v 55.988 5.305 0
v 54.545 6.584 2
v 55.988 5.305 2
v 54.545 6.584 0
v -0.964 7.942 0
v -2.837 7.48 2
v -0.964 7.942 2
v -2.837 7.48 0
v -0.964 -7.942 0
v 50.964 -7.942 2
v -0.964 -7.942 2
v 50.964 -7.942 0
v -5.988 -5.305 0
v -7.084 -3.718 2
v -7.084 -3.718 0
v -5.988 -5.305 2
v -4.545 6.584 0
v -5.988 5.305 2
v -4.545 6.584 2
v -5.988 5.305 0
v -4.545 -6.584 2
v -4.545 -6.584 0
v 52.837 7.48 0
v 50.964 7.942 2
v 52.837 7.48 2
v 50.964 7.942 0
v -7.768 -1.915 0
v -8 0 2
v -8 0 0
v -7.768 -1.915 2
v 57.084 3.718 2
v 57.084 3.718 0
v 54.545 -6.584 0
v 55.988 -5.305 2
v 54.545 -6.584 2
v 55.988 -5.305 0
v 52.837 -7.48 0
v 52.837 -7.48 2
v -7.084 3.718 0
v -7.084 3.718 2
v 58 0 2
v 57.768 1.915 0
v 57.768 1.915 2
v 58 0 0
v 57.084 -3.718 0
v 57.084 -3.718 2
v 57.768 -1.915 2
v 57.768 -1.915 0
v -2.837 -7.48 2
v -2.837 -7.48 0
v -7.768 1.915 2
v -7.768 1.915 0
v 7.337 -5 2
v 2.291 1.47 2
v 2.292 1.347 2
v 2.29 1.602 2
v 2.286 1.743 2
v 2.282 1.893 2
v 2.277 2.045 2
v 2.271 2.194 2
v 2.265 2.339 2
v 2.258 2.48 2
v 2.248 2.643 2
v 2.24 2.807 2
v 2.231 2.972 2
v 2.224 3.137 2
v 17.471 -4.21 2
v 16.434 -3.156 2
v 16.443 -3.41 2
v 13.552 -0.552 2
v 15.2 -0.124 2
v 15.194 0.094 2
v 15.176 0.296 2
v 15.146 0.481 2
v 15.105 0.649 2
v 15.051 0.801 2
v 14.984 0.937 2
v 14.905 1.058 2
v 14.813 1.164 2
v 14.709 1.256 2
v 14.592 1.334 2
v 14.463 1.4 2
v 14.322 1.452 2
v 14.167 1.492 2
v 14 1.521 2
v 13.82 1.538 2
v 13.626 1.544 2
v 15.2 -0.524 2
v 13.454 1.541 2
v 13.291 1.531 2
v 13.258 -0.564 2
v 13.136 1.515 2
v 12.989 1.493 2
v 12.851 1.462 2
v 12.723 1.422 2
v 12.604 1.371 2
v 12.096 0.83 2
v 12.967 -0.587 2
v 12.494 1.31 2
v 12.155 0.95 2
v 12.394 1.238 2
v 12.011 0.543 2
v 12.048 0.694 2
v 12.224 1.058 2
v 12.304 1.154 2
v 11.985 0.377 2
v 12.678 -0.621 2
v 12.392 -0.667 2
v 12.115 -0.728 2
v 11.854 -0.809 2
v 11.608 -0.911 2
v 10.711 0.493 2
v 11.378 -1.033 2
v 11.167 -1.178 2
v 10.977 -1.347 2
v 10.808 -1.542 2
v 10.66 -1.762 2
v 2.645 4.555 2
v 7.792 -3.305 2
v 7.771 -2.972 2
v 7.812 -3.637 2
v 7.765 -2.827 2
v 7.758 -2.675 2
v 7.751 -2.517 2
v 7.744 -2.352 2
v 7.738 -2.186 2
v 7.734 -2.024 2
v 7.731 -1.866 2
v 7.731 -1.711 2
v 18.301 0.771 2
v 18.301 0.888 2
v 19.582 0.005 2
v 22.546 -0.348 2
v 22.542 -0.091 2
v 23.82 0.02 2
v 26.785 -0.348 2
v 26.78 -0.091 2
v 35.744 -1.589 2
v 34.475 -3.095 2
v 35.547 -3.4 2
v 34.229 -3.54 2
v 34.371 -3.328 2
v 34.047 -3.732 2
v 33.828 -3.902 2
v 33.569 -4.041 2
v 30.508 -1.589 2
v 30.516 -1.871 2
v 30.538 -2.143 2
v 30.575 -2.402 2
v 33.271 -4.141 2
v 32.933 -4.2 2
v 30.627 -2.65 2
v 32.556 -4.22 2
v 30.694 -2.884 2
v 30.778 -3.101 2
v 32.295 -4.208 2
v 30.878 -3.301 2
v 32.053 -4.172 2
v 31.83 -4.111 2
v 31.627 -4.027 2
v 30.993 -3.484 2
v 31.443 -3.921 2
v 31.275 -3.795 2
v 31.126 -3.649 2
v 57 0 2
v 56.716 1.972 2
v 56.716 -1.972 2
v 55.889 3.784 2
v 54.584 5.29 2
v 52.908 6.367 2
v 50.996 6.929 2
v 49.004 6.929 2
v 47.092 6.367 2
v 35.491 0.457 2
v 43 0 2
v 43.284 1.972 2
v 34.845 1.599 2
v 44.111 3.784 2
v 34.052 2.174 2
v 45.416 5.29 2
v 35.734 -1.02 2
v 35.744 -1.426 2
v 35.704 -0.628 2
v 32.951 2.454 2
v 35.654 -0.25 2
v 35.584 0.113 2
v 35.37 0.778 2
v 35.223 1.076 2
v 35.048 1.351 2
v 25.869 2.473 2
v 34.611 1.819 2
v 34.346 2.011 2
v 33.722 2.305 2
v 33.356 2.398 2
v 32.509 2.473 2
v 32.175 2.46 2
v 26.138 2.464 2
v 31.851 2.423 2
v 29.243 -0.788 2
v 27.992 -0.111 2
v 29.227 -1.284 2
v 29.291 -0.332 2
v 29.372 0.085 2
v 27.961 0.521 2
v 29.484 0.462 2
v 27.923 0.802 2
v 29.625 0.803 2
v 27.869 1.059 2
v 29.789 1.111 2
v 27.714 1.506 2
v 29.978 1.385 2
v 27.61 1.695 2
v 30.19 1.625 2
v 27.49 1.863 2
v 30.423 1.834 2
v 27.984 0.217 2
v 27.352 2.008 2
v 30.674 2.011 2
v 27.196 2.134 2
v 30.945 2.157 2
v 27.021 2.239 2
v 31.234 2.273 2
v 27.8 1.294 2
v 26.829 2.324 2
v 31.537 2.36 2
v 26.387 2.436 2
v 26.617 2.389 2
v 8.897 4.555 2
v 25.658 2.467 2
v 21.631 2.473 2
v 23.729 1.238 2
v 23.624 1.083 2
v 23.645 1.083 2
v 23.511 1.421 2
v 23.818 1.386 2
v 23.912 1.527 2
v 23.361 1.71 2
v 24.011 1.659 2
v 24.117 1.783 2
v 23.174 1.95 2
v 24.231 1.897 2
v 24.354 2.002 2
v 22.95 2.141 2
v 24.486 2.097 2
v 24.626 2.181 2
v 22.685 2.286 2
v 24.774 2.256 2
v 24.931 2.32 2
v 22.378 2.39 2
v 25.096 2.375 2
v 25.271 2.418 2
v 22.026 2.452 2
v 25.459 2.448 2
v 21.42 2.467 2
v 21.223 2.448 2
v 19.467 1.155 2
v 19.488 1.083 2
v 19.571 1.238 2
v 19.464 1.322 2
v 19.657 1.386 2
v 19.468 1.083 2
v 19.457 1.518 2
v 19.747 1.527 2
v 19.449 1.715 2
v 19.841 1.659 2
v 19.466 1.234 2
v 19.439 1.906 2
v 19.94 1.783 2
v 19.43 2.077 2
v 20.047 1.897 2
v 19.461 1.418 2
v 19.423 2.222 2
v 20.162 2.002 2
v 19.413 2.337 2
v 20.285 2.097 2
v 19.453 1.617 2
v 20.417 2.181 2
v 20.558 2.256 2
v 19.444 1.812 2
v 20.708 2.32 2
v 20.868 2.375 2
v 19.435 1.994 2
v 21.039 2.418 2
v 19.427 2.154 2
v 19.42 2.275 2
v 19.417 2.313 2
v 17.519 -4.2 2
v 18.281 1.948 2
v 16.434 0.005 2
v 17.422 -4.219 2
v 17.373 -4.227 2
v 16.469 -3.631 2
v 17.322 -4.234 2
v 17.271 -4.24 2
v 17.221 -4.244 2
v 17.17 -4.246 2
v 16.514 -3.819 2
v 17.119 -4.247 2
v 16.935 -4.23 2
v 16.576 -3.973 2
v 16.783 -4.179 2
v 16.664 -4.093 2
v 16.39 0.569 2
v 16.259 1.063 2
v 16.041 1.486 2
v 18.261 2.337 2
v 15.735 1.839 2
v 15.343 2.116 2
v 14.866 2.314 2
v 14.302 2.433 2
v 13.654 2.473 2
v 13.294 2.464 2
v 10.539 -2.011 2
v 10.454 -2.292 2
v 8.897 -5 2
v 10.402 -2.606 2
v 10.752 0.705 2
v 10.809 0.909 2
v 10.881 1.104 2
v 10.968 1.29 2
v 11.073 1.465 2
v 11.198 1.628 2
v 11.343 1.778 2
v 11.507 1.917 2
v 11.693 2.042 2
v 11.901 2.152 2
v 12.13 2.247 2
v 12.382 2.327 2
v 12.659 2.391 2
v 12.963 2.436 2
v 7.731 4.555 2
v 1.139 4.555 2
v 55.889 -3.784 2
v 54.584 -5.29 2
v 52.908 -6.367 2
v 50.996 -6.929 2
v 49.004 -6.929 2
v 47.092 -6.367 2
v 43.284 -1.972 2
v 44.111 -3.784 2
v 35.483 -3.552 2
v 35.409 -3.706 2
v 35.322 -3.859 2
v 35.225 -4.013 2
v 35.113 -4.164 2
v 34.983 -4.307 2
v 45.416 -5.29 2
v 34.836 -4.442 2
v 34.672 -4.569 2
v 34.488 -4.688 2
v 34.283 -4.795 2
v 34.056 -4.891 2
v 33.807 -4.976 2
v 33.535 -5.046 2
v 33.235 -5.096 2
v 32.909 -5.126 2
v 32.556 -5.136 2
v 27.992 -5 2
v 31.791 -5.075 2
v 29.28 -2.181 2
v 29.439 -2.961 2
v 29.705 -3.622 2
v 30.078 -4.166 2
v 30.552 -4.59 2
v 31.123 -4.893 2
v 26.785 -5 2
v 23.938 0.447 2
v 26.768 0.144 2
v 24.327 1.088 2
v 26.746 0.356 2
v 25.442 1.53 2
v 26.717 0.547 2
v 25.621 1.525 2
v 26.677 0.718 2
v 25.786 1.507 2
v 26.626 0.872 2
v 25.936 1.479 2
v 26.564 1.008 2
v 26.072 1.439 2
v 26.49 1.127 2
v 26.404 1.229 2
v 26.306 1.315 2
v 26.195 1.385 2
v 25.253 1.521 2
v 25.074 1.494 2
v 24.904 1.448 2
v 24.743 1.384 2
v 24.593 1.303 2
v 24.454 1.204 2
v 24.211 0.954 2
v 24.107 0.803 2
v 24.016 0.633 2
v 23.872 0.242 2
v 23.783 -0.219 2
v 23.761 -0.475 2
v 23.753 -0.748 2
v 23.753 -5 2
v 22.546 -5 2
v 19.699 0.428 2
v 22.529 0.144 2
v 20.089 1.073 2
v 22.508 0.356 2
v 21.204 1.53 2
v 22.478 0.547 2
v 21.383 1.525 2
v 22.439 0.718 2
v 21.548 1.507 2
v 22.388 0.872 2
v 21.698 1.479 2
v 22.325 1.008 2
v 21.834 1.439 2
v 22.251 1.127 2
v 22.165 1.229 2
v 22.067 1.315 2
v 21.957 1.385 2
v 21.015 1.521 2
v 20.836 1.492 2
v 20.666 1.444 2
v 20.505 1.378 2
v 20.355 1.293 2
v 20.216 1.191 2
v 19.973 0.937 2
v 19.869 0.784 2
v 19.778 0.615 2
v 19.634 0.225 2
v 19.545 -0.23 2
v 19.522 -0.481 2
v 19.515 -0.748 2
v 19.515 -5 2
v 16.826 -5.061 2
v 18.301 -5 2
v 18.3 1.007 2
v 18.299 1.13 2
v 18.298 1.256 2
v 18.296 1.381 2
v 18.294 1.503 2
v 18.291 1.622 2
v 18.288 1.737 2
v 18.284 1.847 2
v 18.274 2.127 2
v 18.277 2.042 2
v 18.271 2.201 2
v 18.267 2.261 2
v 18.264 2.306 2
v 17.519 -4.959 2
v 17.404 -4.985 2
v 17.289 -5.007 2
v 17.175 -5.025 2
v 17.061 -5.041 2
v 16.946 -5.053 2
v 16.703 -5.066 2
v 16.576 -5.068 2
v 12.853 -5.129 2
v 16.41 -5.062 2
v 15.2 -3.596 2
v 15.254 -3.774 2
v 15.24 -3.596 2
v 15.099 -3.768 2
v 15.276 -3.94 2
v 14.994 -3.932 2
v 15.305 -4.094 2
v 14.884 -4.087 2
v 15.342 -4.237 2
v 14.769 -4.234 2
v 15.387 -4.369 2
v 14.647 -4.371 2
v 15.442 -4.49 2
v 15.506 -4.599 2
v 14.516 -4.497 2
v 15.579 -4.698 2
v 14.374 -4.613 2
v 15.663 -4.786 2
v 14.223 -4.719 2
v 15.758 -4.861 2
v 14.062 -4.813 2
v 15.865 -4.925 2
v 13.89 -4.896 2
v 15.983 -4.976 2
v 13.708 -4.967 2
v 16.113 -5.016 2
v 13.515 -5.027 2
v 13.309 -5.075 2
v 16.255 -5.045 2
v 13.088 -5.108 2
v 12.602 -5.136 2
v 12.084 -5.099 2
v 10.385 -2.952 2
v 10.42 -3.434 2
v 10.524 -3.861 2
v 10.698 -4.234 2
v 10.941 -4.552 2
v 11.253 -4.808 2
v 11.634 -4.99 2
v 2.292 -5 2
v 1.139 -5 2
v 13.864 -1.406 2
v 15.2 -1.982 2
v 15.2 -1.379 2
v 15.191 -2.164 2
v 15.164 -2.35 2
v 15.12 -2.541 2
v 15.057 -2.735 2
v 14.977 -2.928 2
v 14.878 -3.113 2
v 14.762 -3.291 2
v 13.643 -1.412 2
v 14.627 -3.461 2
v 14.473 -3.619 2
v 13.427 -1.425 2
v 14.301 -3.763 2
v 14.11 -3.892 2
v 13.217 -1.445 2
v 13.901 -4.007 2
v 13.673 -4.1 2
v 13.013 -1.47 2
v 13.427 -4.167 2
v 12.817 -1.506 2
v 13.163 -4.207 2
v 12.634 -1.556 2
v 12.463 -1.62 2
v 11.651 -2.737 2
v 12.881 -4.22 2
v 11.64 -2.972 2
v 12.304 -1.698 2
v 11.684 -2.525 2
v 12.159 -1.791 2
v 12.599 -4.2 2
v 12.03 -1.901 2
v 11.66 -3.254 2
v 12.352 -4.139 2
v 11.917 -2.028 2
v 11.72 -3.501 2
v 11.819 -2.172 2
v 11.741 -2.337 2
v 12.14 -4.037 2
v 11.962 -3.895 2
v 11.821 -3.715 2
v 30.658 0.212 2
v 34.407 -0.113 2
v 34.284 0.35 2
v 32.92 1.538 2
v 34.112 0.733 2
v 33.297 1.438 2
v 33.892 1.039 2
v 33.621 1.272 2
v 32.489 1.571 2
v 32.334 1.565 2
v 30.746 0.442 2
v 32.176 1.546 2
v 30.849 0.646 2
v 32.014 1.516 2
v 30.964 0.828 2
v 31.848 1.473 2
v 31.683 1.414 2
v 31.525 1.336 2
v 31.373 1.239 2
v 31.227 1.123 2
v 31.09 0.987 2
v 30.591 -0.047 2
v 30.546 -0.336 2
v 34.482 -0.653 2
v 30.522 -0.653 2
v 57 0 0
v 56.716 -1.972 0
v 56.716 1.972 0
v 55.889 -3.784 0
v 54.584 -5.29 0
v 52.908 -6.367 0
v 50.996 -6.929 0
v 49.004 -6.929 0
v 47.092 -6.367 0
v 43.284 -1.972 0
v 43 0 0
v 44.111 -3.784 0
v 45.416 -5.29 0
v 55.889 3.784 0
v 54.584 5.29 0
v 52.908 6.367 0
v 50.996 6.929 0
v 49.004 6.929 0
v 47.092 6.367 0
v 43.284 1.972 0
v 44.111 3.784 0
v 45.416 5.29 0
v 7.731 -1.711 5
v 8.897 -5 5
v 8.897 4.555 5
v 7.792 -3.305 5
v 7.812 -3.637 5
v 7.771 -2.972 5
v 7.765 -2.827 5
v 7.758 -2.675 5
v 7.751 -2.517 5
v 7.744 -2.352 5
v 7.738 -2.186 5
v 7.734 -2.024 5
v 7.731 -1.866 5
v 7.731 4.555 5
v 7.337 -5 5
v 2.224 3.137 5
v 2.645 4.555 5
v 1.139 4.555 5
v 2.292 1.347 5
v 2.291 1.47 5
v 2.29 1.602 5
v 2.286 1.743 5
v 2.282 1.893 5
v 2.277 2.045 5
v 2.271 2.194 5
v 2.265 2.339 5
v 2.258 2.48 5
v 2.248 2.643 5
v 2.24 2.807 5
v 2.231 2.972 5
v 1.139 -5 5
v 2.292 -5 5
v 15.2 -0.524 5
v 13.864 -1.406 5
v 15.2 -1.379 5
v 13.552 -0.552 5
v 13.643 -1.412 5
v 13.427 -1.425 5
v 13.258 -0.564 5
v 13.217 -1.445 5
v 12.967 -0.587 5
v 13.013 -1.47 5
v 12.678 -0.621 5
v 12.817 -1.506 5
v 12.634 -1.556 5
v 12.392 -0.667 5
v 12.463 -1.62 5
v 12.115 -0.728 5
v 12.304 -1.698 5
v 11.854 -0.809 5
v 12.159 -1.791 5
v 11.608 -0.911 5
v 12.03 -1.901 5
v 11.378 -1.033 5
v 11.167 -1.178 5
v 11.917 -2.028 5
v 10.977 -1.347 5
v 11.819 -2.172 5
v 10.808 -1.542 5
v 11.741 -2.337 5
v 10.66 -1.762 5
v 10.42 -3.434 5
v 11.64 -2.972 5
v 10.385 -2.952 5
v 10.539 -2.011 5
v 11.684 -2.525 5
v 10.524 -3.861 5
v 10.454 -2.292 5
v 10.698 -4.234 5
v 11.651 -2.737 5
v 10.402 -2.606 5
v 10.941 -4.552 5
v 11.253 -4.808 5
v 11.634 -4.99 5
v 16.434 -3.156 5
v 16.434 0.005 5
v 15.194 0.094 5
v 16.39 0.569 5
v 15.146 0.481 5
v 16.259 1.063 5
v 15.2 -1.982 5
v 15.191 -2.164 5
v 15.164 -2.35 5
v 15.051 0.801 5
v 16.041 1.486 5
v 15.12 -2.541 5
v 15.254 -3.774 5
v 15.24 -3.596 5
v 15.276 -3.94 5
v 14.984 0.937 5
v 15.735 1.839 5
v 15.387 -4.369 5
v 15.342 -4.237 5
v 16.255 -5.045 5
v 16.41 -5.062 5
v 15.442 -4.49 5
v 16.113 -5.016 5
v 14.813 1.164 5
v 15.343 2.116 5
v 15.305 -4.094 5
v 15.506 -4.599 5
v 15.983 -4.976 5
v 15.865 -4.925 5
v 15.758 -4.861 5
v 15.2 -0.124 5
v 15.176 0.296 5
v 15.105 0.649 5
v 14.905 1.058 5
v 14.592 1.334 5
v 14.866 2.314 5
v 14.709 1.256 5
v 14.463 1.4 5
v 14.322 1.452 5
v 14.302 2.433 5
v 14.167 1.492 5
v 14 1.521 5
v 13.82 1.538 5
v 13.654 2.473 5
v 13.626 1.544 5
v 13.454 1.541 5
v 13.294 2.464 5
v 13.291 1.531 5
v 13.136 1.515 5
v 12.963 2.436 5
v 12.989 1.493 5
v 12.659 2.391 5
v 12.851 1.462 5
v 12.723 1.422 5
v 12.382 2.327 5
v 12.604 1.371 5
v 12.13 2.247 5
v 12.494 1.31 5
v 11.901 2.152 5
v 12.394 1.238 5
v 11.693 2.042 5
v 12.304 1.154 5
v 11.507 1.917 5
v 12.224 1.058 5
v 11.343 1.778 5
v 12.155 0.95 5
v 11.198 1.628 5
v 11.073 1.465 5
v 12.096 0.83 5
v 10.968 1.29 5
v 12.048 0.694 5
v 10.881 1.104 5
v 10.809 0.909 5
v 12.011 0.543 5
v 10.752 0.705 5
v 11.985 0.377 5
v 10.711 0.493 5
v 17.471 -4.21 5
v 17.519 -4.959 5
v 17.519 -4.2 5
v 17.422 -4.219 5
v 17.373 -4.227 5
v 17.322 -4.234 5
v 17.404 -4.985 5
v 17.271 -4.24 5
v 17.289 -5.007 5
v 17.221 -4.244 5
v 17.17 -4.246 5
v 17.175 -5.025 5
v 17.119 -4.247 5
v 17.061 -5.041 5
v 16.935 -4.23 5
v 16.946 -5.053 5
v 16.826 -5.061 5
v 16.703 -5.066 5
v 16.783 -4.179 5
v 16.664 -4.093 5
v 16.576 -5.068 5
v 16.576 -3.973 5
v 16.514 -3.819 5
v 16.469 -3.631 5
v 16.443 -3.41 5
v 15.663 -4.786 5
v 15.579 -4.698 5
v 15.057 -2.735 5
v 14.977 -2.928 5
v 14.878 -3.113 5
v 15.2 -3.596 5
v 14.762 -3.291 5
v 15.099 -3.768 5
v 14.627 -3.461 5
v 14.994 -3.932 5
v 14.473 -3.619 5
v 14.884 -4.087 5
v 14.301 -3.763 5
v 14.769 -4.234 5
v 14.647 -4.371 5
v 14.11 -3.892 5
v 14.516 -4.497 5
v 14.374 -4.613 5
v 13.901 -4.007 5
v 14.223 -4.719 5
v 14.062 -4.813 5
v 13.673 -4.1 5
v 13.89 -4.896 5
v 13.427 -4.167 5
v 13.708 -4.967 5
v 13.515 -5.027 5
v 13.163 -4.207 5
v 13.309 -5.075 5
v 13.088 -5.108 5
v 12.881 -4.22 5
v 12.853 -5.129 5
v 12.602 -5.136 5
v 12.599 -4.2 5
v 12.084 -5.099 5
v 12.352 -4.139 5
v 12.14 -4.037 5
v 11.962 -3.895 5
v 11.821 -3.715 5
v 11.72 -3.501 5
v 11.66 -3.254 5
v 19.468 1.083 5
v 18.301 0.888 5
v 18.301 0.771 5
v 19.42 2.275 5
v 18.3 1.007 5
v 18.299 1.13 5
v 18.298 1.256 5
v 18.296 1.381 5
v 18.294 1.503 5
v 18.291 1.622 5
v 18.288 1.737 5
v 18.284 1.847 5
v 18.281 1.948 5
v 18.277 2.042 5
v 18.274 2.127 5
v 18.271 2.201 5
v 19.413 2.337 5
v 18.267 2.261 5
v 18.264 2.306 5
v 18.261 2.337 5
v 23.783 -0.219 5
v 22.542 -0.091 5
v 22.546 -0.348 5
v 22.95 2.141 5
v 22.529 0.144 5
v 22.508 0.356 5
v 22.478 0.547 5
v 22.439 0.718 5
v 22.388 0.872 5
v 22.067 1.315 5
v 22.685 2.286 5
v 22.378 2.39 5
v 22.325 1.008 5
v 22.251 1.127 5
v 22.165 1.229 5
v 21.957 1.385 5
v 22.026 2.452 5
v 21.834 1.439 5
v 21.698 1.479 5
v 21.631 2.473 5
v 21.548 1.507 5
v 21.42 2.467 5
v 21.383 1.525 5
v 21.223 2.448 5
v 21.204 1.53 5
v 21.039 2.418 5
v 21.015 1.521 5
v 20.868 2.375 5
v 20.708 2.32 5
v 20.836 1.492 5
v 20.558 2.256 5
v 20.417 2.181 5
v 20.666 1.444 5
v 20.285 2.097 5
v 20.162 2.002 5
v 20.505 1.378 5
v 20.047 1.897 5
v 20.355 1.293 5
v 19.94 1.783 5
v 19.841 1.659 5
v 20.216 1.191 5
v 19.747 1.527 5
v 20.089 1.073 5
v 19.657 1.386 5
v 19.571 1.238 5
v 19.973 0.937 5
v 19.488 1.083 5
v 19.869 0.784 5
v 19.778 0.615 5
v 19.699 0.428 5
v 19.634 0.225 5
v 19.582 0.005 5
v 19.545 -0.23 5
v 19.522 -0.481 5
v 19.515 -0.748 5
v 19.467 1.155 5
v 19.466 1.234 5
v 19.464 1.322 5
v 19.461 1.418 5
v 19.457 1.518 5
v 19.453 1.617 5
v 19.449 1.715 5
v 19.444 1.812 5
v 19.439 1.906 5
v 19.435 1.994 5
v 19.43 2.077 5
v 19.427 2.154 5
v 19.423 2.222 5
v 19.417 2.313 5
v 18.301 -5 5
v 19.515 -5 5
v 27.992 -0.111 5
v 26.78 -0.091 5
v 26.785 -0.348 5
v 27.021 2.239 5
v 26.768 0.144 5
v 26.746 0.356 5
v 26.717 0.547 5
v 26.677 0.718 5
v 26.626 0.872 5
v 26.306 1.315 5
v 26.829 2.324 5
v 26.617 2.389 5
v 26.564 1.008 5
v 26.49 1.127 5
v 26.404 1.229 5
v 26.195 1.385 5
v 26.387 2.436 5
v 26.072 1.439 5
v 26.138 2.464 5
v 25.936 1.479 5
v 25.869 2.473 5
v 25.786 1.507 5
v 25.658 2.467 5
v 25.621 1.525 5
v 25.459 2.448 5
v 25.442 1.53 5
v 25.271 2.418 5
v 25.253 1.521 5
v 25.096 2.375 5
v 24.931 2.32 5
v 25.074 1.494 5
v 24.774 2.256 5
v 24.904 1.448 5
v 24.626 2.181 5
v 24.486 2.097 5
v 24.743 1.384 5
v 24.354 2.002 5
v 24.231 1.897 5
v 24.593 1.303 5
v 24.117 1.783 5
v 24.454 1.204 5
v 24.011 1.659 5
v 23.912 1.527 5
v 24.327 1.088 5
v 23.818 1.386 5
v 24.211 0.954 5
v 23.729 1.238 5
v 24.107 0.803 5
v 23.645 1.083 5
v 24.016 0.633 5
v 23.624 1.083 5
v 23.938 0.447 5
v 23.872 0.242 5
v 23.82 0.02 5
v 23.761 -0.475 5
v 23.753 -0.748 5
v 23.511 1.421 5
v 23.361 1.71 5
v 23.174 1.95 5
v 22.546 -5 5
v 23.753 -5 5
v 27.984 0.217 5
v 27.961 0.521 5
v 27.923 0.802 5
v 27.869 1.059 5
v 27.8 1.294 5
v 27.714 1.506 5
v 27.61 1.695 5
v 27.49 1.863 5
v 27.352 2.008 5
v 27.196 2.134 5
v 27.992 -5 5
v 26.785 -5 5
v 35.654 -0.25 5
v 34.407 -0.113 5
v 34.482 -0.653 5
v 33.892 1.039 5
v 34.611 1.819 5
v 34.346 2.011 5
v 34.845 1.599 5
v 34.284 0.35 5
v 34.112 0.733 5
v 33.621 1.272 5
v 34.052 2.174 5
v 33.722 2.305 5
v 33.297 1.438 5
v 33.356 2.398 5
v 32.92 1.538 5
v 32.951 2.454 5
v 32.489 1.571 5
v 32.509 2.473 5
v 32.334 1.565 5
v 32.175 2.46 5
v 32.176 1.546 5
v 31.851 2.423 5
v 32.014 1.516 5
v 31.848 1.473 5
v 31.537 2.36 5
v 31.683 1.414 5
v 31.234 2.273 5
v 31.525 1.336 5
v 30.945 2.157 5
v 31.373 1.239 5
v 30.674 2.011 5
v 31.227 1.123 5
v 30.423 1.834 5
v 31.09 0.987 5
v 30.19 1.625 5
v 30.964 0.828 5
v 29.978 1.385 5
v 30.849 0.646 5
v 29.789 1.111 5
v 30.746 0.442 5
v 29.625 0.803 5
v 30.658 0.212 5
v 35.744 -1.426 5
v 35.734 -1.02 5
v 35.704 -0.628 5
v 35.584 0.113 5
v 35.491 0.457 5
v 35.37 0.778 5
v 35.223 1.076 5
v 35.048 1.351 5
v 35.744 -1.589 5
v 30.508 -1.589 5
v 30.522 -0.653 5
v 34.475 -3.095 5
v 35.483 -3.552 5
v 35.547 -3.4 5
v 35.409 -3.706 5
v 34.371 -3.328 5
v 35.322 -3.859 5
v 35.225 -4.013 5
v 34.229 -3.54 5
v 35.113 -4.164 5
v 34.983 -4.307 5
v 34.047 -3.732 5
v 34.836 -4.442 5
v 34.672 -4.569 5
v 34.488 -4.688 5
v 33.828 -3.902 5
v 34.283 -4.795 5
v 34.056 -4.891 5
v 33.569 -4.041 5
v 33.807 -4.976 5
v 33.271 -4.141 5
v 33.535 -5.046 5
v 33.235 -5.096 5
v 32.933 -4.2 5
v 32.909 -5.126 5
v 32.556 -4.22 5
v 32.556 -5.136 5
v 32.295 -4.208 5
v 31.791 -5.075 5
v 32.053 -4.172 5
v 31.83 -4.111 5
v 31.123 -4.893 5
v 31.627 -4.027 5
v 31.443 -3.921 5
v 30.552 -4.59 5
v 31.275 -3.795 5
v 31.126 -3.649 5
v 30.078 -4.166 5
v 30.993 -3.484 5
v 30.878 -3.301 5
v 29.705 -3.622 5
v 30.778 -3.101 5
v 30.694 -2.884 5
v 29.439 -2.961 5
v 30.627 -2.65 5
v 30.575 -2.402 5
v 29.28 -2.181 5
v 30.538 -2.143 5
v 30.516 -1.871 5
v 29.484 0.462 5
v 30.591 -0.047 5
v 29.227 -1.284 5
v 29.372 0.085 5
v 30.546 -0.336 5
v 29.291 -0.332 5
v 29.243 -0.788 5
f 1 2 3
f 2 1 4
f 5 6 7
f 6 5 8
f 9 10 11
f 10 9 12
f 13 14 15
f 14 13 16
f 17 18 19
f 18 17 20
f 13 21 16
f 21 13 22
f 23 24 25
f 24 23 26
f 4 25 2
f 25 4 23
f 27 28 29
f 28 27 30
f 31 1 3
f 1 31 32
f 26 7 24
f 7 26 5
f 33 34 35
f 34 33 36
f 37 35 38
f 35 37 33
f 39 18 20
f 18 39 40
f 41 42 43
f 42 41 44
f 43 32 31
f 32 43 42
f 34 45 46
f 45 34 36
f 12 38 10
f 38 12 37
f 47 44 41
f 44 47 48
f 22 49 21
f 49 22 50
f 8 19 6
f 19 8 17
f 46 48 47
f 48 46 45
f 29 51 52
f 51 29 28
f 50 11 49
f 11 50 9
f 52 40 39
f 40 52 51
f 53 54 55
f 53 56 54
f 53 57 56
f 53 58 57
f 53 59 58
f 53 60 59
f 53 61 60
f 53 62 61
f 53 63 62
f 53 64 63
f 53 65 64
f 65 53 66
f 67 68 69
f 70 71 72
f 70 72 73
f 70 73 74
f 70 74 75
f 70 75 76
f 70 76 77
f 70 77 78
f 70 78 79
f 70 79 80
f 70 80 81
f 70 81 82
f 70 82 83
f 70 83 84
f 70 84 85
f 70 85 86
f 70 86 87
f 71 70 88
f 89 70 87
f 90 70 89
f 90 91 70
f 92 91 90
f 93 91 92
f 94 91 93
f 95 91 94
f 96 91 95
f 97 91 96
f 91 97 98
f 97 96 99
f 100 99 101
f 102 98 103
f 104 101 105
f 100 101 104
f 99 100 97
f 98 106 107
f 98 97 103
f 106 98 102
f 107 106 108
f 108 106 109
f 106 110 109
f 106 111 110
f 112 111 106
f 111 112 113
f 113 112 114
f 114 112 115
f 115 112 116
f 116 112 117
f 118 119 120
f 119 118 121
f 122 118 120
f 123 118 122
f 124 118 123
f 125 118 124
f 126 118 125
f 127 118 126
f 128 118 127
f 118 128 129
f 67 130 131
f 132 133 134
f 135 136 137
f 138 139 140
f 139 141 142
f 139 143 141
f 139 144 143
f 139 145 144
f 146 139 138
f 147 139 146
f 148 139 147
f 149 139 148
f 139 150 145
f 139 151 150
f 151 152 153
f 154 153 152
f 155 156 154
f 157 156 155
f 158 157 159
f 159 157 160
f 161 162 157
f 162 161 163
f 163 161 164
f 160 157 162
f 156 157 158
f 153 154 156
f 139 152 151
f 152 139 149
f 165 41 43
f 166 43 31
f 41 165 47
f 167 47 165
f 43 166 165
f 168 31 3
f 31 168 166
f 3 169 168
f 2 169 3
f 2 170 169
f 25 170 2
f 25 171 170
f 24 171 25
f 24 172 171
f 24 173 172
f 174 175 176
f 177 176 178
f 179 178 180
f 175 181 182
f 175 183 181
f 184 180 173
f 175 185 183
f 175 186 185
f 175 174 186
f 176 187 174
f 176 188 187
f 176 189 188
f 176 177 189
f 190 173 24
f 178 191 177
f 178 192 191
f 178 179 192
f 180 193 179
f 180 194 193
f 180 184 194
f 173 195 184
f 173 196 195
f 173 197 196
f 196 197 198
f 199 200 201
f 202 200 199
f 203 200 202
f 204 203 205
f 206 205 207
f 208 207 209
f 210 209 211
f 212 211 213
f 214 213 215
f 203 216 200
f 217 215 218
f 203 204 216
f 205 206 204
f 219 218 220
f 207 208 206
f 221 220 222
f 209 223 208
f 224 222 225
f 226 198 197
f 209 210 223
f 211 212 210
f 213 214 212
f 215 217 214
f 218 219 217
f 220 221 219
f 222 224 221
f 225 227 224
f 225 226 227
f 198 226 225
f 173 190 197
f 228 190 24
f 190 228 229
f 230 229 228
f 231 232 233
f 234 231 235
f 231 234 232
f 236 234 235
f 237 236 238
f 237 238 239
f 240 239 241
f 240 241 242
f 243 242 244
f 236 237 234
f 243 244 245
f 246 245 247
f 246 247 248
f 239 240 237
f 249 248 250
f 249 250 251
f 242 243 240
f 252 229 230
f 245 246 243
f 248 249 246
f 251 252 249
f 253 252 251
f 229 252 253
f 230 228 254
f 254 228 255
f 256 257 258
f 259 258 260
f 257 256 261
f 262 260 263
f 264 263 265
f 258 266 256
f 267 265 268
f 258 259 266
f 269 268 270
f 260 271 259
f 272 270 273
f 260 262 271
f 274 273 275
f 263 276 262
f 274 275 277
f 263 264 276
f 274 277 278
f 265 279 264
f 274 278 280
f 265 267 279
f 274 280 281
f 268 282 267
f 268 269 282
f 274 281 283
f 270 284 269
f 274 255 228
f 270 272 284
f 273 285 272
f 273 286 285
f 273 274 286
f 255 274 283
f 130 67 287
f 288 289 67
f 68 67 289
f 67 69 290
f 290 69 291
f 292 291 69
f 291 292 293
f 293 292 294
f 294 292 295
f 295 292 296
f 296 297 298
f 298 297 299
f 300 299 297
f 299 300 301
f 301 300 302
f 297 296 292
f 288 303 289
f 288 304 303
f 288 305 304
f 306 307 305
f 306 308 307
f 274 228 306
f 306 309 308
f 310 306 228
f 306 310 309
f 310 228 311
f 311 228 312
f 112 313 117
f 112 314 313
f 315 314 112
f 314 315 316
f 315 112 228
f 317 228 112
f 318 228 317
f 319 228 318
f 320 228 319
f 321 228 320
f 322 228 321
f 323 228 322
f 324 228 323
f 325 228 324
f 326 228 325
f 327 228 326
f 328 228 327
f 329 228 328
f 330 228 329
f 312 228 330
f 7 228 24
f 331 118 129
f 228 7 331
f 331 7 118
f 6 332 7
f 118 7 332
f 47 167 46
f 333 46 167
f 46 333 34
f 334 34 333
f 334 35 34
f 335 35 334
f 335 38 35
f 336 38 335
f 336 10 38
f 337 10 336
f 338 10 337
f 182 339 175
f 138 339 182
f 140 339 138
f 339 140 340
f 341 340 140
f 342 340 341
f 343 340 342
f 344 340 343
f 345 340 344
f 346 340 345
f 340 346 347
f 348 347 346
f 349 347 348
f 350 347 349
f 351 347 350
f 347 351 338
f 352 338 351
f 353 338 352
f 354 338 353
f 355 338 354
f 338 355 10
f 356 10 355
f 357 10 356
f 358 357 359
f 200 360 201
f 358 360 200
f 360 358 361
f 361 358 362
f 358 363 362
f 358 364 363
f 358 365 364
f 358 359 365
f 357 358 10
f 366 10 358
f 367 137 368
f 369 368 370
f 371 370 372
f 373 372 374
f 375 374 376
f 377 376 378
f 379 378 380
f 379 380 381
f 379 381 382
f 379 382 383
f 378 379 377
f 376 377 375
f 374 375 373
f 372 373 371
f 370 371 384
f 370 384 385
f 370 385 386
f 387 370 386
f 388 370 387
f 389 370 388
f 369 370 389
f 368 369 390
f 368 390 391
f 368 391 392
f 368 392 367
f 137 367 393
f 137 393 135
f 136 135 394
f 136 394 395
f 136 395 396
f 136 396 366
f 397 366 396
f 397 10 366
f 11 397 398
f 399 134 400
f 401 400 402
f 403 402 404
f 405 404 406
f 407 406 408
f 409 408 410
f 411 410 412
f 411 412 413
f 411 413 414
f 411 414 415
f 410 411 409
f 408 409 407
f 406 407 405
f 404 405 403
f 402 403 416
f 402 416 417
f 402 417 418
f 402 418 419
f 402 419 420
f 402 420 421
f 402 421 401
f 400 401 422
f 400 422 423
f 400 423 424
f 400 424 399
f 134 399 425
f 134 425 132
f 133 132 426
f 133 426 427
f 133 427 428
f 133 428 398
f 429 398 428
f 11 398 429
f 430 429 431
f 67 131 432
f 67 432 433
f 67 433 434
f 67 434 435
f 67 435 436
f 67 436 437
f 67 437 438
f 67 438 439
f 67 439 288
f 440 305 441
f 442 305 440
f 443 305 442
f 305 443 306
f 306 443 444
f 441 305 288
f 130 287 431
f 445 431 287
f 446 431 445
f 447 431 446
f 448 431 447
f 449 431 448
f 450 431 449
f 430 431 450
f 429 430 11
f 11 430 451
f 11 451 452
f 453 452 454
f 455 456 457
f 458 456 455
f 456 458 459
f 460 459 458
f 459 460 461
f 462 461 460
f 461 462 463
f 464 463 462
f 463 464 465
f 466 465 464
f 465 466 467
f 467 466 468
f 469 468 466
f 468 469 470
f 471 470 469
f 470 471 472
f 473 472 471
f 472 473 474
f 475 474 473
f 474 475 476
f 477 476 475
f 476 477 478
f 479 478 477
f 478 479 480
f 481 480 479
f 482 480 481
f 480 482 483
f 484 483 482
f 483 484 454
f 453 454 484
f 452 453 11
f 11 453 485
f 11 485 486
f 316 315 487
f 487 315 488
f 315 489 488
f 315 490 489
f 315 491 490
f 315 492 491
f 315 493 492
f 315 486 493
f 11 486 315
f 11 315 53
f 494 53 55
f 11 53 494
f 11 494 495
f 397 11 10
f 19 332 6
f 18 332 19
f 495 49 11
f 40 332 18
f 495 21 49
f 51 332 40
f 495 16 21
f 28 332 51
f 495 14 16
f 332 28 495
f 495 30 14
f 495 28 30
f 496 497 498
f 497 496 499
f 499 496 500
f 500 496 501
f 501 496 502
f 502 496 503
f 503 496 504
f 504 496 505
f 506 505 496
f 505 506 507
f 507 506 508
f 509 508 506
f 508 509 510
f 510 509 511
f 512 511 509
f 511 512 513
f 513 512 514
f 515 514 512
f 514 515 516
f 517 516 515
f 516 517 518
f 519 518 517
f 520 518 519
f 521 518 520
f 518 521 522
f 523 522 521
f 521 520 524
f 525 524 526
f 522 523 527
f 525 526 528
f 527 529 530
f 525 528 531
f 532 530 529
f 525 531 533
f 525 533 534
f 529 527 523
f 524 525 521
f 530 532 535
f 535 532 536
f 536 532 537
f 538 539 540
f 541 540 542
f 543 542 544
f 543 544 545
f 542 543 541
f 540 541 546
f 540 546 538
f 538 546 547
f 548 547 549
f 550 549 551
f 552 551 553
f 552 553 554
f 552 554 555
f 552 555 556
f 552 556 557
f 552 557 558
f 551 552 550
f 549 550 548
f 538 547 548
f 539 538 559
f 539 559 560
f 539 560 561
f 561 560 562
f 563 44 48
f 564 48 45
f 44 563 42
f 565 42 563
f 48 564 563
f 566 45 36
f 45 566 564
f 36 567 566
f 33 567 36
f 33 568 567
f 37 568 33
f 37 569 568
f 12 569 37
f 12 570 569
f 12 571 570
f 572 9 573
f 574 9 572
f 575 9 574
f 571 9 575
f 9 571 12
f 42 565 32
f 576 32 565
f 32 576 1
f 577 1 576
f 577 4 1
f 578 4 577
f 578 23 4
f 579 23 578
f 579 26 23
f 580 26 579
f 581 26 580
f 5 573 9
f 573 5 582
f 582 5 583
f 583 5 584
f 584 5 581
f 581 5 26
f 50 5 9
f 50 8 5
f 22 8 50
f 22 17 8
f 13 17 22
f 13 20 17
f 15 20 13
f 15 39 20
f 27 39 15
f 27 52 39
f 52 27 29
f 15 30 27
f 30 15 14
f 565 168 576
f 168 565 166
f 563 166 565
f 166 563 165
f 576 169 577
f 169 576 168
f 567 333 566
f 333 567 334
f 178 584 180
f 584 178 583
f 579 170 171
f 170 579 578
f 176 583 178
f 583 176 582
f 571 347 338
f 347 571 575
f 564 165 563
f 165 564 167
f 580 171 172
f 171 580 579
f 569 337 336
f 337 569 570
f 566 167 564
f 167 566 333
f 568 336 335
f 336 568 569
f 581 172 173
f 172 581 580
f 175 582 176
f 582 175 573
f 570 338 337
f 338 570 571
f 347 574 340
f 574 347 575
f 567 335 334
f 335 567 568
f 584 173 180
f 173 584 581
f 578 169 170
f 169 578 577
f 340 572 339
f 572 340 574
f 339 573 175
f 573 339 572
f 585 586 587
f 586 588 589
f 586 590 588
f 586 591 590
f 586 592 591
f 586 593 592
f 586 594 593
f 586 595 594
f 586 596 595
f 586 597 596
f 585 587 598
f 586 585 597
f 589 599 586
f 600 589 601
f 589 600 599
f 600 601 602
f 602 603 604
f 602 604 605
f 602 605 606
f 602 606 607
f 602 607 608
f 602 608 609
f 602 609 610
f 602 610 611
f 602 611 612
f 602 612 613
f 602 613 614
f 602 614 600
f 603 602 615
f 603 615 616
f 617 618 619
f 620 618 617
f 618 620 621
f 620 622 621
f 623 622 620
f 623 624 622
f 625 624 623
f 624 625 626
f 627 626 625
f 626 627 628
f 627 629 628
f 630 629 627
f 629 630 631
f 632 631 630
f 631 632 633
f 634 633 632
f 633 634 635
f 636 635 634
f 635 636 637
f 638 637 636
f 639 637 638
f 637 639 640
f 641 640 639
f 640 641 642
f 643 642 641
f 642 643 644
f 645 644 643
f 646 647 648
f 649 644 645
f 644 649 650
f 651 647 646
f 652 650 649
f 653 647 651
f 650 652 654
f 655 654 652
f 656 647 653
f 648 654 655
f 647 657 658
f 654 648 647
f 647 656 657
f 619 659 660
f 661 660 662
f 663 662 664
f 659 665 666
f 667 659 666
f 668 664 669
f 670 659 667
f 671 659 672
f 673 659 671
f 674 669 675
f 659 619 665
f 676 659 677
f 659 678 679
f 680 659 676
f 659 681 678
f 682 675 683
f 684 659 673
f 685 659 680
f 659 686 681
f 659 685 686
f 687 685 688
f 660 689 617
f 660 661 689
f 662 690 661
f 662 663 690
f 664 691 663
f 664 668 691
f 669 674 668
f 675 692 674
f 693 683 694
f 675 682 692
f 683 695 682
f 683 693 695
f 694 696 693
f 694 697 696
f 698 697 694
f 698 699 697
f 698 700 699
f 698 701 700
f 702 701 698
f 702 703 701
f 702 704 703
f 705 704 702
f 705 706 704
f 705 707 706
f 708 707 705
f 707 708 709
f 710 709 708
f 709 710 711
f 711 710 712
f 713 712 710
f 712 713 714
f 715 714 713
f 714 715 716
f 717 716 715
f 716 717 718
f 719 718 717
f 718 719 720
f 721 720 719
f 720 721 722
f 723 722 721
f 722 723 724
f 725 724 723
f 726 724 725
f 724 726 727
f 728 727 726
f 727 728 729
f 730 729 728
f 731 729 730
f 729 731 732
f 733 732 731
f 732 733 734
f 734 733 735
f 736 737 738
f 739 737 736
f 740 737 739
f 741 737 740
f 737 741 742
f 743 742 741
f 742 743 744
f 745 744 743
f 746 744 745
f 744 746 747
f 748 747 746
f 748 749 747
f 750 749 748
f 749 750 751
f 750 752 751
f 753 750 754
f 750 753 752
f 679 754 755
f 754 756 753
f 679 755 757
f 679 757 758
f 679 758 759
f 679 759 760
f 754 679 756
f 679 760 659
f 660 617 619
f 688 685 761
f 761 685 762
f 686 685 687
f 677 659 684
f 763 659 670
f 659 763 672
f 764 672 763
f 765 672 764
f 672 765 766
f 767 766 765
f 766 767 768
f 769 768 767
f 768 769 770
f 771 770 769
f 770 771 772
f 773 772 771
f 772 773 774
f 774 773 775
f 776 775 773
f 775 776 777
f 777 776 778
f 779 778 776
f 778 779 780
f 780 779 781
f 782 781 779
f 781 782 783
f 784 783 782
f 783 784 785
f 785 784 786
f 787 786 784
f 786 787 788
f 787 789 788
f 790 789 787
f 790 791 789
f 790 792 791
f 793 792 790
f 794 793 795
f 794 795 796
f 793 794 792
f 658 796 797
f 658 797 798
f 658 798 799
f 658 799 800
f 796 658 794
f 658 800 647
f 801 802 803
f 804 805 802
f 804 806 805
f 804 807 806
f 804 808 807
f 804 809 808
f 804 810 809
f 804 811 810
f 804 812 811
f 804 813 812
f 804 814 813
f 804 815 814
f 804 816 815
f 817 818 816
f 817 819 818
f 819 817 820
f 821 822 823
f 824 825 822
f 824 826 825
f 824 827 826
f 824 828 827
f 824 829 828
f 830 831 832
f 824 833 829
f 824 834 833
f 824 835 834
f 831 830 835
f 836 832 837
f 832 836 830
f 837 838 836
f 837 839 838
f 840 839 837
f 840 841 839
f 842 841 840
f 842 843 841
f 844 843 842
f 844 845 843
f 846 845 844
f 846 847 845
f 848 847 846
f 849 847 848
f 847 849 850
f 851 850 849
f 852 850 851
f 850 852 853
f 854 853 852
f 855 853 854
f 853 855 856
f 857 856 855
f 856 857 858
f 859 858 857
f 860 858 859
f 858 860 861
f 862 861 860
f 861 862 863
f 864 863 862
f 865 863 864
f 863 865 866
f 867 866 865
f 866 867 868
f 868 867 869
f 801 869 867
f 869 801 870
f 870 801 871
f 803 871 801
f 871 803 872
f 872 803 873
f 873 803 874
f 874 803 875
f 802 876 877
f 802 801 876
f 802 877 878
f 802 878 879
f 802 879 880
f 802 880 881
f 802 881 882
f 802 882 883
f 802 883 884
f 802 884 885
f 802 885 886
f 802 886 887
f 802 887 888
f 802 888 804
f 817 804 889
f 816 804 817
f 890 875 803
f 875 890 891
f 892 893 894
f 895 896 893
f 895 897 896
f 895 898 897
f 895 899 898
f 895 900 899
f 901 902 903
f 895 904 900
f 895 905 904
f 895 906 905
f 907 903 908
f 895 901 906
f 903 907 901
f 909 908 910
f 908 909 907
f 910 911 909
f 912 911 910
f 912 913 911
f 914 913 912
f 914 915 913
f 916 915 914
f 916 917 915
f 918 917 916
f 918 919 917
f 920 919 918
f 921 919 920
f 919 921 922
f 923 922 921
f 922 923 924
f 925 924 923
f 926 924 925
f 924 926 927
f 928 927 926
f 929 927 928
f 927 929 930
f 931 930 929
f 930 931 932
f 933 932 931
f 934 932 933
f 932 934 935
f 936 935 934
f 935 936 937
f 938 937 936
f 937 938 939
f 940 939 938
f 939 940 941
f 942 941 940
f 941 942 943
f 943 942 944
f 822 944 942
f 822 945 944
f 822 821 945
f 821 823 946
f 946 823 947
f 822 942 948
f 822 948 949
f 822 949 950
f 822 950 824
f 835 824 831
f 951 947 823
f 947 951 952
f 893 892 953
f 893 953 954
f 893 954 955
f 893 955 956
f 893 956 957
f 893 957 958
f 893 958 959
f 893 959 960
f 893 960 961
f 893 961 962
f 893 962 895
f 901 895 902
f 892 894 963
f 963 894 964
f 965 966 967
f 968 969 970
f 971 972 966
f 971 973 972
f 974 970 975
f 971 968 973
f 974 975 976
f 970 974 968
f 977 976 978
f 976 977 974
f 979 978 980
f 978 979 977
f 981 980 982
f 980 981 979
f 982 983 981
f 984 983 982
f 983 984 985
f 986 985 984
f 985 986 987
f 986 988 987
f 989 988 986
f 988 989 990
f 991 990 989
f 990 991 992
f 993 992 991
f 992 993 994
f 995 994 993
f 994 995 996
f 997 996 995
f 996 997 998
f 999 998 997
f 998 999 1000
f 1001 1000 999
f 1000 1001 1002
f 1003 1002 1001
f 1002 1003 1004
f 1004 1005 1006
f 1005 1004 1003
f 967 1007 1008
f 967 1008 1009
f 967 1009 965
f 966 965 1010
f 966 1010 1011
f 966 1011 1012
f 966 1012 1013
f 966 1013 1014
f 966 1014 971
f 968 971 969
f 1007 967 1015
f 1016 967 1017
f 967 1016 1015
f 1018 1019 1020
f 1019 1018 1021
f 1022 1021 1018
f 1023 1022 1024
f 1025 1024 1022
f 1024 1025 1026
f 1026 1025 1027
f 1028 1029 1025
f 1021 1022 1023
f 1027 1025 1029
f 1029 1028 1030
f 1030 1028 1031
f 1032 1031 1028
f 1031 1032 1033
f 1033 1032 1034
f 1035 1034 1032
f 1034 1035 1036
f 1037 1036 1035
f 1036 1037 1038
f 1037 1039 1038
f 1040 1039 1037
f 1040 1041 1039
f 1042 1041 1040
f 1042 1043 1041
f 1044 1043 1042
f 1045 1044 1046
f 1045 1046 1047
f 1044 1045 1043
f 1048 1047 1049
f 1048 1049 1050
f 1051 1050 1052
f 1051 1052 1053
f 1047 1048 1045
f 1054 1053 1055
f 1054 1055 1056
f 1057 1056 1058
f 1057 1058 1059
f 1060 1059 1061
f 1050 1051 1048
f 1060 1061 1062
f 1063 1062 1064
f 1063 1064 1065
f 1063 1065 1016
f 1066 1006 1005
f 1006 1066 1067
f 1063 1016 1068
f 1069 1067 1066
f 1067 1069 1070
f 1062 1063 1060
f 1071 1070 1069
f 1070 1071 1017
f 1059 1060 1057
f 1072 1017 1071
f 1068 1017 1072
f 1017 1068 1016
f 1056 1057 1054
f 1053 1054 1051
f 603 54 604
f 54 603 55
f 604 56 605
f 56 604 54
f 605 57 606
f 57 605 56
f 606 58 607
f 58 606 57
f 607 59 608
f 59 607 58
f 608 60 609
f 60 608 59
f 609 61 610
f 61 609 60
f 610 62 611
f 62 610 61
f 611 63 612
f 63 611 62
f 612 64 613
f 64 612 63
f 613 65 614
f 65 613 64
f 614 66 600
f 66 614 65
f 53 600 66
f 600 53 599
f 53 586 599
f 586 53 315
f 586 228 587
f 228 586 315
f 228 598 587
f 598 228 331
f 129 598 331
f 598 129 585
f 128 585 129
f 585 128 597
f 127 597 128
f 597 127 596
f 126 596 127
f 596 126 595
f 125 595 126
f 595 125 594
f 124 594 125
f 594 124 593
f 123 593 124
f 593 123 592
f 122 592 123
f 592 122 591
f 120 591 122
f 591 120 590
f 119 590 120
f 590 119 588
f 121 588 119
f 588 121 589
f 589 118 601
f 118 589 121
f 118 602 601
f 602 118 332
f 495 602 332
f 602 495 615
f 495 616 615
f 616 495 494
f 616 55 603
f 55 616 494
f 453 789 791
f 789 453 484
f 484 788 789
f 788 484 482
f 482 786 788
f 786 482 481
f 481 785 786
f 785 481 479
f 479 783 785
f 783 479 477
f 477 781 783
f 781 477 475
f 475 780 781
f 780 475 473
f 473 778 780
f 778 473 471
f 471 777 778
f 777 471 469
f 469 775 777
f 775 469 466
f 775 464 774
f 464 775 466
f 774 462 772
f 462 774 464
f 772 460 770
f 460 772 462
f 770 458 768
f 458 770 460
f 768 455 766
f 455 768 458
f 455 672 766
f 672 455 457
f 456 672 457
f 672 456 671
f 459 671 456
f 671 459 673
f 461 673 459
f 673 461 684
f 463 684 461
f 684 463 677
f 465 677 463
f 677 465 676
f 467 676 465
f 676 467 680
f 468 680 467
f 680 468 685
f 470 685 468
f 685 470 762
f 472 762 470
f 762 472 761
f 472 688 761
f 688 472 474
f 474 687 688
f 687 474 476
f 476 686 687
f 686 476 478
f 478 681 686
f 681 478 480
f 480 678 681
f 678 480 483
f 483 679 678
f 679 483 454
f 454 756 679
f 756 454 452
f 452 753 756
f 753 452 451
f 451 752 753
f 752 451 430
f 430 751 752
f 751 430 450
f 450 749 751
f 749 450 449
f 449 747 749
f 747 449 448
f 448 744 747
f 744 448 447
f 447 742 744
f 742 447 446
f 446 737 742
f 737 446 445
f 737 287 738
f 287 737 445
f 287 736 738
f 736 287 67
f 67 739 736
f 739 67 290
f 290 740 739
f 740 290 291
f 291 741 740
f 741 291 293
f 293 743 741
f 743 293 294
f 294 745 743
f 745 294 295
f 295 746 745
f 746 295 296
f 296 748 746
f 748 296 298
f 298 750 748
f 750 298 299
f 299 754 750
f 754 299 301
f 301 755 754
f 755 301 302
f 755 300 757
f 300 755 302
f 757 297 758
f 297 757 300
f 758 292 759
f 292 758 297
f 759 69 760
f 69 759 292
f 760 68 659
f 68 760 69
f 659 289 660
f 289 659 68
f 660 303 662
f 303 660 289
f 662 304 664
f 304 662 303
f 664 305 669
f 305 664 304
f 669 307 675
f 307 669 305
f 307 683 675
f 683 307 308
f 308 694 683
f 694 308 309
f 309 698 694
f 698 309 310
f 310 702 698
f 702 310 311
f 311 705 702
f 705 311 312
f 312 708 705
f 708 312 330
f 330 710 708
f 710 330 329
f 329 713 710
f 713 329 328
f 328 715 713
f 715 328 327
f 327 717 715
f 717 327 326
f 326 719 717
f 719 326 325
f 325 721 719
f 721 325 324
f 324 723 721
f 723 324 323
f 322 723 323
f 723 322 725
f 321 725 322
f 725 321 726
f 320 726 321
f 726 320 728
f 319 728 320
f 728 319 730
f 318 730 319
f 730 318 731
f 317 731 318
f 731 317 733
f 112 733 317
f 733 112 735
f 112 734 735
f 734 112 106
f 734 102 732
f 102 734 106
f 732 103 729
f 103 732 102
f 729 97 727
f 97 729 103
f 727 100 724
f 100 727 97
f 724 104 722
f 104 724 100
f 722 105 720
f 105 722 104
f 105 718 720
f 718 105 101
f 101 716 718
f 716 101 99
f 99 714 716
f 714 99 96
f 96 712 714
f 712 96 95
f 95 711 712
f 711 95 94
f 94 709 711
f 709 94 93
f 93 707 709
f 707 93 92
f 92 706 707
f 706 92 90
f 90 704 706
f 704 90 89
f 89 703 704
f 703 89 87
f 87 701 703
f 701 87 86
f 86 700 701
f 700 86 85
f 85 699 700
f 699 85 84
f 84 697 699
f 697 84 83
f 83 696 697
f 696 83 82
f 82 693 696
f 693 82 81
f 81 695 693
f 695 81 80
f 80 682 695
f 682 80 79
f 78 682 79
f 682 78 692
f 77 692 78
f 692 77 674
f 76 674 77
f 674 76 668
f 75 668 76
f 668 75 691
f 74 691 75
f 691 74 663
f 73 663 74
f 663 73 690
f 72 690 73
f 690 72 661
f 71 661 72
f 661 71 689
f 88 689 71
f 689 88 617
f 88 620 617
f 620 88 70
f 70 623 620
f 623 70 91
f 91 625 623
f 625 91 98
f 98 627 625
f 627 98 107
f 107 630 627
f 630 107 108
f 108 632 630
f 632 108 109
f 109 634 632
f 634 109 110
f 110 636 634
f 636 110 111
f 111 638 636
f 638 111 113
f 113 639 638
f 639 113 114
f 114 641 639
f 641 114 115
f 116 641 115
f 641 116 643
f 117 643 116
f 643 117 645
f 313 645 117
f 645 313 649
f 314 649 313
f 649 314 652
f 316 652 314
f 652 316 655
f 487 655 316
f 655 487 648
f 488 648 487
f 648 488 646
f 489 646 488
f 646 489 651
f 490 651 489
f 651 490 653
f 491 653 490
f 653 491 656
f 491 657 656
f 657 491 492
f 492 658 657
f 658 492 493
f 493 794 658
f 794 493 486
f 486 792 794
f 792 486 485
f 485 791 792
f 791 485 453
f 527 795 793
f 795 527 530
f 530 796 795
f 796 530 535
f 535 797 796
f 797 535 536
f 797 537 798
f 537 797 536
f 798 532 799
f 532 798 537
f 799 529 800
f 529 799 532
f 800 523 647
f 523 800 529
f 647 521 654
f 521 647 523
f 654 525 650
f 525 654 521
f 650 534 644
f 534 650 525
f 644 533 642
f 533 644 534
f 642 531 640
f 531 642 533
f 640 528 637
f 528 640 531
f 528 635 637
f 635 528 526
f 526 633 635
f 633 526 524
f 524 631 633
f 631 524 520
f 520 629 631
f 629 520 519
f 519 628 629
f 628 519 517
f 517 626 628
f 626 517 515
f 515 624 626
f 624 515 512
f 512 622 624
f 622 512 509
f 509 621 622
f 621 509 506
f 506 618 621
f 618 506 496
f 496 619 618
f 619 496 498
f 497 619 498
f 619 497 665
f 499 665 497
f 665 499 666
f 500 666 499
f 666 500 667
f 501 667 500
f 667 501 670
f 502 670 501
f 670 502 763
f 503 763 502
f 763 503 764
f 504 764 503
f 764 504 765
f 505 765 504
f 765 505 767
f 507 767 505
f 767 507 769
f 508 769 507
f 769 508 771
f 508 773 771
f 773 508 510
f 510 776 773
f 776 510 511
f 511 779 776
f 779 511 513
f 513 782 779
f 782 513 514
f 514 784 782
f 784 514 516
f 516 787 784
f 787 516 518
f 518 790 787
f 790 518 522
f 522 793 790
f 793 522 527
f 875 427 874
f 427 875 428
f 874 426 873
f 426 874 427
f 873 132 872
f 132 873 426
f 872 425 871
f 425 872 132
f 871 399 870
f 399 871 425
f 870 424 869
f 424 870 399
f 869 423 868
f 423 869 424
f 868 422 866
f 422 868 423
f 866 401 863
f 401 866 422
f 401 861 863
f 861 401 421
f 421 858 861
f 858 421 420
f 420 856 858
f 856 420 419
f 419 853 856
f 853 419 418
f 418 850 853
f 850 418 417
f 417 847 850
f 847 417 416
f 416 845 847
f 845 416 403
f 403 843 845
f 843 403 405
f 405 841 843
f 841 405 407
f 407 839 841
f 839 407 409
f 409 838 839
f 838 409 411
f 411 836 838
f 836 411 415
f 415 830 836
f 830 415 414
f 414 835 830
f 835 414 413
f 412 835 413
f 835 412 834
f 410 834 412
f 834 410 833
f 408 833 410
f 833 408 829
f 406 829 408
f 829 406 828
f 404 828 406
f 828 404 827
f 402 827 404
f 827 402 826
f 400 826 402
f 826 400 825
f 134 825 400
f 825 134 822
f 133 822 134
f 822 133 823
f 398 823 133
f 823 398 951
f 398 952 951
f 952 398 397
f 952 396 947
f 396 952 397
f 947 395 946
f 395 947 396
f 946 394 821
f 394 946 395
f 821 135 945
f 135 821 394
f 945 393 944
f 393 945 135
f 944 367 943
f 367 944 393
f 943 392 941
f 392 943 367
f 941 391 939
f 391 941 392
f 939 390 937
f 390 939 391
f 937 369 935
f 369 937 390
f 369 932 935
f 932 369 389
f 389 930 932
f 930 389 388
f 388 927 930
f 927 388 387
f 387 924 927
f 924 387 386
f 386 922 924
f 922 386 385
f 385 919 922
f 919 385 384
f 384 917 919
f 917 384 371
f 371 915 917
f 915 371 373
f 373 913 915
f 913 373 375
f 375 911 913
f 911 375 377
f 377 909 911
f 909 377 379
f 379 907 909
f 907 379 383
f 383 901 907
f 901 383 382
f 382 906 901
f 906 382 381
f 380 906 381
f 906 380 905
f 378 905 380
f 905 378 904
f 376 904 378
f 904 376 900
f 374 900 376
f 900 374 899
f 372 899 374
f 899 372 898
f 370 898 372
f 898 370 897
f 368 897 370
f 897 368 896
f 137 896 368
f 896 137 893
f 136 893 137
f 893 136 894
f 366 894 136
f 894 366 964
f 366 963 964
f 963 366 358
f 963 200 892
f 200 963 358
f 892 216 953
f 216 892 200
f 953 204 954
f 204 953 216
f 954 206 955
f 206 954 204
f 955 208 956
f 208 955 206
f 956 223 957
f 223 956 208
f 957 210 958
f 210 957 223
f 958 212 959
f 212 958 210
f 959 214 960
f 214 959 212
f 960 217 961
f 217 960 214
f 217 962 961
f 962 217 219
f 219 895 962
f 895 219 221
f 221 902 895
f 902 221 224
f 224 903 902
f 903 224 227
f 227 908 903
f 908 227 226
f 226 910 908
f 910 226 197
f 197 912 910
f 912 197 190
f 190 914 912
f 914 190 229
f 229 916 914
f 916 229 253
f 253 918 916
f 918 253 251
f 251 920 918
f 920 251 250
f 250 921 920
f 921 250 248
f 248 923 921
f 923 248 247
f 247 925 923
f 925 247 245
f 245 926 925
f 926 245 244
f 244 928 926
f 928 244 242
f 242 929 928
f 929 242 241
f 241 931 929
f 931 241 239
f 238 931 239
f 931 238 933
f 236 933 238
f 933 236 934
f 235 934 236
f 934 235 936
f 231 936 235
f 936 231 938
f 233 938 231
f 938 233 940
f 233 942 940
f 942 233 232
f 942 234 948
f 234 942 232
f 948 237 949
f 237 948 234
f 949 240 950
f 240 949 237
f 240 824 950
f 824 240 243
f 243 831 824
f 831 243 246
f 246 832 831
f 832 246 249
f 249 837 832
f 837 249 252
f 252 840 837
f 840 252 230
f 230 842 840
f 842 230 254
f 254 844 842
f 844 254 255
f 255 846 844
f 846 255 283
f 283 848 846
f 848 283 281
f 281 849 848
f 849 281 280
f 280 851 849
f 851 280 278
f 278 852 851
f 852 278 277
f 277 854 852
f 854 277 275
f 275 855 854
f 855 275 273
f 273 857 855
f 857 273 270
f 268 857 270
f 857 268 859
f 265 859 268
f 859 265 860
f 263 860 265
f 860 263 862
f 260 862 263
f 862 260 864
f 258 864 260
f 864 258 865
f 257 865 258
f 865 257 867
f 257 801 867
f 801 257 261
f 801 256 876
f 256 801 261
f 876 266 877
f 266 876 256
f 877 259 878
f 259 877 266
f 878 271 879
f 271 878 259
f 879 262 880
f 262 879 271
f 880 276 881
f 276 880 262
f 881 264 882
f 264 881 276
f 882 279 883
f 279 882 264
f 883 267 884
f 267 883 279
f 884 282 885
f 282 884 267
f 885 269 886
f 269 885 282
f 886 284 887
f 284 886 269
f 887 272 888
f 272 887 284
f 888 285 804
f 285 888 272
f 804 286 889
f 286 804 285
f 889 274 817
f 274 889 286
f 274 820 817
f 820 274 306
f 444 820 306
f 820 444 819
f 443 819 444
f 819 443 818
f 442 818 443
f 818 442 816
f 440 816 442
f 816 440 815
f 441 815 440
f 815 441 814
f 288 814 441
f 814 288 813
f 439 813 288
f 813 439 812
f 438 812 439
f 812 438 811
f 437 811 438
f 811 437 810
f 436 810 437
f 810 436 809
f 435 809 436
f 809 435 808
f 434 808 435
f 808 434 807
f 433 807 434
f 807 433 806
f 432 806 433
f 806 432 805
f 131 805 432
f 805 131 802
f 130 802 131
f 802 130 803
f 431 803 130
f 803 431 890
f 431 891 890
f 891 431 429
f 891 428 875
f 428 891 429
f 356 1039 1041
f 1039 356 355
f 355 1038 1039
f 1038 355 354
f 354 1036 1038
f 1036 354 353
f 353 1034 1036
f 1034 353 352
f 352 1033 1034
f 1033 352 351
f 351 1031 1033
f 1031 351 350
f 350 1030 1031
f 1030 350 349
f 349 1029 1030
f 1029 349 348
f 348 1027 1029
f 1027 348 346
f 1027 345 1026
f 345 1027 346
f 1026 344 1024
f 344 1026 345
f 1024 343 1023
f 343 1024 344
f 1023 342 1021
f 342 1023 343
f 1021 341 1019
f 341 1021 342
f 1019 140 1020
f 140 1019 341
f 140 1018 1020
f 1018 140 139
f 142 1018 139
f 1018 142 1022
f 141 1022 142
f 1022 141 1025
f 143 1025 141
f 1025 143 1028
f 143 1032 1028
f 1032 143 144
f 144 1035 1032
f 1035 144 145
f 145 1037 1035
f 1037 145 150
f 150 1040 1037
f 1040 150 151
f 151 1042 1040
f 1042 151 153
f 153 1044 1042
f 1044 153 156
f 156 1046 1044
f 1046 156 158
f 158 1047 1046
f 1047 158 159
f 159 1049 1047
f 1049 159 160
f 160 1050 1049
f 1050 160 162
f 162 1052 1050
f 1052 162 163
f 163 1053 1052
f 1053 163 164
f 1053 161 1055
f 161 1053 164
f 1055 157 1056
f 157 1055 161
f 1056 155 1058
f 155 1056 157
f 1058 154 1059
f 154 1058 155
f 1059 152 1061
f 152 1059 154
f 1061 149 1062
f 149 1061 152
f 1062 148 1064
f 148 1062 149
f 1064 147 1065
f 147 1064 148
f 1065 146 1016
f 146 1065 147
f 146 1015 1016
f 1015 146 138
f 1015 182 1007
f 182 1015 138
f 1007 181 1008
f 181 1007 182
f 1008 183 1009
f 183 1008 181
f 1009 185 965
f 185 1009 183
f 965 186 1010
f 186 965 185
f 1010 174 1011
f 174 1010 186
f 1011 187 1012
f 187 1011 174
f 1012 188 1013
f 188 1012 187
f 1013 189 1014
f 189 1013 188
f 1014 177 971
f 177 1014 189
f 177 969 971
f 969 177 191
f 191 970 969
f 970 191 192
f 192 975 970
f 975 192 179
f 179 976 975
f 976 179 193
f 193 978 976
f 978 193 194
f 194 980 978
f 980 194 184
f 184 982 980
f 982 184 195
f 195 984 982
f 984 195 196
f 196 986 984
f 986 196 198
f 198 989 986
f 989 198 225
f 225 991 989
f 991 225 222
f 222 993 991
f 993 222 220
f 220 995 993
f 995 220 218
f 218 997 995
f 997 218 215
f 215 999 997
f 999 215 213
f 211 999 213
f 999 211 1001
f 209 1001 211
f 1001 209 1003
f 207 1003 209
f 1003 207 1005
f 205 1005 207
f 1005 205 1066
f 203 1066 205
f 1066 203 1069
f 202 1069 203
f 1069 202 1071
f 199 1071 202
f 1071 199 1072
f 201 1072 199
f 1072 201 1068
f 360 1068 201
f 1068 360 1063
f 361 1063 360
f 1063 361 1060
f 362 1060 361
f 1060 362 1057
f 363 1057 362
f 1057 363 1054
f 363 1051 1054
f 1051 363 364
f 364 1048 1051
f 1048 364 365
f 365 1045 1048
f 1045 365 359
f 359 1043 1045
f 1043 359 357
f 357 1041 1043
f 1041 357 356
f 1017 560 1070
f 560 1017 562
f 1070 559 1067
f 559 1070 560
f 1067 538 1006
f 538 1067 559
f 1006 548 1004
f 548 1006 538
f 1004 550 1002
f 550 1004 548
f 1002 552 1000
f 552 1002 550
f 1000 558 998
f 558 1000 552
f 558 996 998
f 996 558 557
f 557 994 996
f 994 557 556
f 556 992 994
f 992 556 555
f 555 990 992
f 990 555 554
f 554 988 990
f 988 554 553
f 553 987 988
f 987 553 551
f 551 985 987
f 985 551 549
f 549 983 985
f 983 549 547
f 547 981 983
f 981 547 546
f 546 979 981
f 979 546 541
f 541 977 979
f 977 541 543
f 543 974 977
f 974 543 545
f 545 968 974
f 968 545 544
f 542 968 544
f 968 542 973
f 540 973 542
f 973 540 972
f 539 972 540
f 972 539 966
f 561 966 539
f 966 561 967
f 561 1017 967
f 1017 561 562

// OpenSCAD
//Name Tag - Customizable
Name = "Name";
Lenght = 50;

linear_extrude(height = 5)
translate([0, -5, 0])
text(Name);

difference(){
    hull(){
        cylinder(h=2,d=16);
        translate([Lenght,0,0])
        cylinder(h=2,d=16);
    }
    translate([Lenght,0,0])
    cylinder(h=2,d=14);

}
